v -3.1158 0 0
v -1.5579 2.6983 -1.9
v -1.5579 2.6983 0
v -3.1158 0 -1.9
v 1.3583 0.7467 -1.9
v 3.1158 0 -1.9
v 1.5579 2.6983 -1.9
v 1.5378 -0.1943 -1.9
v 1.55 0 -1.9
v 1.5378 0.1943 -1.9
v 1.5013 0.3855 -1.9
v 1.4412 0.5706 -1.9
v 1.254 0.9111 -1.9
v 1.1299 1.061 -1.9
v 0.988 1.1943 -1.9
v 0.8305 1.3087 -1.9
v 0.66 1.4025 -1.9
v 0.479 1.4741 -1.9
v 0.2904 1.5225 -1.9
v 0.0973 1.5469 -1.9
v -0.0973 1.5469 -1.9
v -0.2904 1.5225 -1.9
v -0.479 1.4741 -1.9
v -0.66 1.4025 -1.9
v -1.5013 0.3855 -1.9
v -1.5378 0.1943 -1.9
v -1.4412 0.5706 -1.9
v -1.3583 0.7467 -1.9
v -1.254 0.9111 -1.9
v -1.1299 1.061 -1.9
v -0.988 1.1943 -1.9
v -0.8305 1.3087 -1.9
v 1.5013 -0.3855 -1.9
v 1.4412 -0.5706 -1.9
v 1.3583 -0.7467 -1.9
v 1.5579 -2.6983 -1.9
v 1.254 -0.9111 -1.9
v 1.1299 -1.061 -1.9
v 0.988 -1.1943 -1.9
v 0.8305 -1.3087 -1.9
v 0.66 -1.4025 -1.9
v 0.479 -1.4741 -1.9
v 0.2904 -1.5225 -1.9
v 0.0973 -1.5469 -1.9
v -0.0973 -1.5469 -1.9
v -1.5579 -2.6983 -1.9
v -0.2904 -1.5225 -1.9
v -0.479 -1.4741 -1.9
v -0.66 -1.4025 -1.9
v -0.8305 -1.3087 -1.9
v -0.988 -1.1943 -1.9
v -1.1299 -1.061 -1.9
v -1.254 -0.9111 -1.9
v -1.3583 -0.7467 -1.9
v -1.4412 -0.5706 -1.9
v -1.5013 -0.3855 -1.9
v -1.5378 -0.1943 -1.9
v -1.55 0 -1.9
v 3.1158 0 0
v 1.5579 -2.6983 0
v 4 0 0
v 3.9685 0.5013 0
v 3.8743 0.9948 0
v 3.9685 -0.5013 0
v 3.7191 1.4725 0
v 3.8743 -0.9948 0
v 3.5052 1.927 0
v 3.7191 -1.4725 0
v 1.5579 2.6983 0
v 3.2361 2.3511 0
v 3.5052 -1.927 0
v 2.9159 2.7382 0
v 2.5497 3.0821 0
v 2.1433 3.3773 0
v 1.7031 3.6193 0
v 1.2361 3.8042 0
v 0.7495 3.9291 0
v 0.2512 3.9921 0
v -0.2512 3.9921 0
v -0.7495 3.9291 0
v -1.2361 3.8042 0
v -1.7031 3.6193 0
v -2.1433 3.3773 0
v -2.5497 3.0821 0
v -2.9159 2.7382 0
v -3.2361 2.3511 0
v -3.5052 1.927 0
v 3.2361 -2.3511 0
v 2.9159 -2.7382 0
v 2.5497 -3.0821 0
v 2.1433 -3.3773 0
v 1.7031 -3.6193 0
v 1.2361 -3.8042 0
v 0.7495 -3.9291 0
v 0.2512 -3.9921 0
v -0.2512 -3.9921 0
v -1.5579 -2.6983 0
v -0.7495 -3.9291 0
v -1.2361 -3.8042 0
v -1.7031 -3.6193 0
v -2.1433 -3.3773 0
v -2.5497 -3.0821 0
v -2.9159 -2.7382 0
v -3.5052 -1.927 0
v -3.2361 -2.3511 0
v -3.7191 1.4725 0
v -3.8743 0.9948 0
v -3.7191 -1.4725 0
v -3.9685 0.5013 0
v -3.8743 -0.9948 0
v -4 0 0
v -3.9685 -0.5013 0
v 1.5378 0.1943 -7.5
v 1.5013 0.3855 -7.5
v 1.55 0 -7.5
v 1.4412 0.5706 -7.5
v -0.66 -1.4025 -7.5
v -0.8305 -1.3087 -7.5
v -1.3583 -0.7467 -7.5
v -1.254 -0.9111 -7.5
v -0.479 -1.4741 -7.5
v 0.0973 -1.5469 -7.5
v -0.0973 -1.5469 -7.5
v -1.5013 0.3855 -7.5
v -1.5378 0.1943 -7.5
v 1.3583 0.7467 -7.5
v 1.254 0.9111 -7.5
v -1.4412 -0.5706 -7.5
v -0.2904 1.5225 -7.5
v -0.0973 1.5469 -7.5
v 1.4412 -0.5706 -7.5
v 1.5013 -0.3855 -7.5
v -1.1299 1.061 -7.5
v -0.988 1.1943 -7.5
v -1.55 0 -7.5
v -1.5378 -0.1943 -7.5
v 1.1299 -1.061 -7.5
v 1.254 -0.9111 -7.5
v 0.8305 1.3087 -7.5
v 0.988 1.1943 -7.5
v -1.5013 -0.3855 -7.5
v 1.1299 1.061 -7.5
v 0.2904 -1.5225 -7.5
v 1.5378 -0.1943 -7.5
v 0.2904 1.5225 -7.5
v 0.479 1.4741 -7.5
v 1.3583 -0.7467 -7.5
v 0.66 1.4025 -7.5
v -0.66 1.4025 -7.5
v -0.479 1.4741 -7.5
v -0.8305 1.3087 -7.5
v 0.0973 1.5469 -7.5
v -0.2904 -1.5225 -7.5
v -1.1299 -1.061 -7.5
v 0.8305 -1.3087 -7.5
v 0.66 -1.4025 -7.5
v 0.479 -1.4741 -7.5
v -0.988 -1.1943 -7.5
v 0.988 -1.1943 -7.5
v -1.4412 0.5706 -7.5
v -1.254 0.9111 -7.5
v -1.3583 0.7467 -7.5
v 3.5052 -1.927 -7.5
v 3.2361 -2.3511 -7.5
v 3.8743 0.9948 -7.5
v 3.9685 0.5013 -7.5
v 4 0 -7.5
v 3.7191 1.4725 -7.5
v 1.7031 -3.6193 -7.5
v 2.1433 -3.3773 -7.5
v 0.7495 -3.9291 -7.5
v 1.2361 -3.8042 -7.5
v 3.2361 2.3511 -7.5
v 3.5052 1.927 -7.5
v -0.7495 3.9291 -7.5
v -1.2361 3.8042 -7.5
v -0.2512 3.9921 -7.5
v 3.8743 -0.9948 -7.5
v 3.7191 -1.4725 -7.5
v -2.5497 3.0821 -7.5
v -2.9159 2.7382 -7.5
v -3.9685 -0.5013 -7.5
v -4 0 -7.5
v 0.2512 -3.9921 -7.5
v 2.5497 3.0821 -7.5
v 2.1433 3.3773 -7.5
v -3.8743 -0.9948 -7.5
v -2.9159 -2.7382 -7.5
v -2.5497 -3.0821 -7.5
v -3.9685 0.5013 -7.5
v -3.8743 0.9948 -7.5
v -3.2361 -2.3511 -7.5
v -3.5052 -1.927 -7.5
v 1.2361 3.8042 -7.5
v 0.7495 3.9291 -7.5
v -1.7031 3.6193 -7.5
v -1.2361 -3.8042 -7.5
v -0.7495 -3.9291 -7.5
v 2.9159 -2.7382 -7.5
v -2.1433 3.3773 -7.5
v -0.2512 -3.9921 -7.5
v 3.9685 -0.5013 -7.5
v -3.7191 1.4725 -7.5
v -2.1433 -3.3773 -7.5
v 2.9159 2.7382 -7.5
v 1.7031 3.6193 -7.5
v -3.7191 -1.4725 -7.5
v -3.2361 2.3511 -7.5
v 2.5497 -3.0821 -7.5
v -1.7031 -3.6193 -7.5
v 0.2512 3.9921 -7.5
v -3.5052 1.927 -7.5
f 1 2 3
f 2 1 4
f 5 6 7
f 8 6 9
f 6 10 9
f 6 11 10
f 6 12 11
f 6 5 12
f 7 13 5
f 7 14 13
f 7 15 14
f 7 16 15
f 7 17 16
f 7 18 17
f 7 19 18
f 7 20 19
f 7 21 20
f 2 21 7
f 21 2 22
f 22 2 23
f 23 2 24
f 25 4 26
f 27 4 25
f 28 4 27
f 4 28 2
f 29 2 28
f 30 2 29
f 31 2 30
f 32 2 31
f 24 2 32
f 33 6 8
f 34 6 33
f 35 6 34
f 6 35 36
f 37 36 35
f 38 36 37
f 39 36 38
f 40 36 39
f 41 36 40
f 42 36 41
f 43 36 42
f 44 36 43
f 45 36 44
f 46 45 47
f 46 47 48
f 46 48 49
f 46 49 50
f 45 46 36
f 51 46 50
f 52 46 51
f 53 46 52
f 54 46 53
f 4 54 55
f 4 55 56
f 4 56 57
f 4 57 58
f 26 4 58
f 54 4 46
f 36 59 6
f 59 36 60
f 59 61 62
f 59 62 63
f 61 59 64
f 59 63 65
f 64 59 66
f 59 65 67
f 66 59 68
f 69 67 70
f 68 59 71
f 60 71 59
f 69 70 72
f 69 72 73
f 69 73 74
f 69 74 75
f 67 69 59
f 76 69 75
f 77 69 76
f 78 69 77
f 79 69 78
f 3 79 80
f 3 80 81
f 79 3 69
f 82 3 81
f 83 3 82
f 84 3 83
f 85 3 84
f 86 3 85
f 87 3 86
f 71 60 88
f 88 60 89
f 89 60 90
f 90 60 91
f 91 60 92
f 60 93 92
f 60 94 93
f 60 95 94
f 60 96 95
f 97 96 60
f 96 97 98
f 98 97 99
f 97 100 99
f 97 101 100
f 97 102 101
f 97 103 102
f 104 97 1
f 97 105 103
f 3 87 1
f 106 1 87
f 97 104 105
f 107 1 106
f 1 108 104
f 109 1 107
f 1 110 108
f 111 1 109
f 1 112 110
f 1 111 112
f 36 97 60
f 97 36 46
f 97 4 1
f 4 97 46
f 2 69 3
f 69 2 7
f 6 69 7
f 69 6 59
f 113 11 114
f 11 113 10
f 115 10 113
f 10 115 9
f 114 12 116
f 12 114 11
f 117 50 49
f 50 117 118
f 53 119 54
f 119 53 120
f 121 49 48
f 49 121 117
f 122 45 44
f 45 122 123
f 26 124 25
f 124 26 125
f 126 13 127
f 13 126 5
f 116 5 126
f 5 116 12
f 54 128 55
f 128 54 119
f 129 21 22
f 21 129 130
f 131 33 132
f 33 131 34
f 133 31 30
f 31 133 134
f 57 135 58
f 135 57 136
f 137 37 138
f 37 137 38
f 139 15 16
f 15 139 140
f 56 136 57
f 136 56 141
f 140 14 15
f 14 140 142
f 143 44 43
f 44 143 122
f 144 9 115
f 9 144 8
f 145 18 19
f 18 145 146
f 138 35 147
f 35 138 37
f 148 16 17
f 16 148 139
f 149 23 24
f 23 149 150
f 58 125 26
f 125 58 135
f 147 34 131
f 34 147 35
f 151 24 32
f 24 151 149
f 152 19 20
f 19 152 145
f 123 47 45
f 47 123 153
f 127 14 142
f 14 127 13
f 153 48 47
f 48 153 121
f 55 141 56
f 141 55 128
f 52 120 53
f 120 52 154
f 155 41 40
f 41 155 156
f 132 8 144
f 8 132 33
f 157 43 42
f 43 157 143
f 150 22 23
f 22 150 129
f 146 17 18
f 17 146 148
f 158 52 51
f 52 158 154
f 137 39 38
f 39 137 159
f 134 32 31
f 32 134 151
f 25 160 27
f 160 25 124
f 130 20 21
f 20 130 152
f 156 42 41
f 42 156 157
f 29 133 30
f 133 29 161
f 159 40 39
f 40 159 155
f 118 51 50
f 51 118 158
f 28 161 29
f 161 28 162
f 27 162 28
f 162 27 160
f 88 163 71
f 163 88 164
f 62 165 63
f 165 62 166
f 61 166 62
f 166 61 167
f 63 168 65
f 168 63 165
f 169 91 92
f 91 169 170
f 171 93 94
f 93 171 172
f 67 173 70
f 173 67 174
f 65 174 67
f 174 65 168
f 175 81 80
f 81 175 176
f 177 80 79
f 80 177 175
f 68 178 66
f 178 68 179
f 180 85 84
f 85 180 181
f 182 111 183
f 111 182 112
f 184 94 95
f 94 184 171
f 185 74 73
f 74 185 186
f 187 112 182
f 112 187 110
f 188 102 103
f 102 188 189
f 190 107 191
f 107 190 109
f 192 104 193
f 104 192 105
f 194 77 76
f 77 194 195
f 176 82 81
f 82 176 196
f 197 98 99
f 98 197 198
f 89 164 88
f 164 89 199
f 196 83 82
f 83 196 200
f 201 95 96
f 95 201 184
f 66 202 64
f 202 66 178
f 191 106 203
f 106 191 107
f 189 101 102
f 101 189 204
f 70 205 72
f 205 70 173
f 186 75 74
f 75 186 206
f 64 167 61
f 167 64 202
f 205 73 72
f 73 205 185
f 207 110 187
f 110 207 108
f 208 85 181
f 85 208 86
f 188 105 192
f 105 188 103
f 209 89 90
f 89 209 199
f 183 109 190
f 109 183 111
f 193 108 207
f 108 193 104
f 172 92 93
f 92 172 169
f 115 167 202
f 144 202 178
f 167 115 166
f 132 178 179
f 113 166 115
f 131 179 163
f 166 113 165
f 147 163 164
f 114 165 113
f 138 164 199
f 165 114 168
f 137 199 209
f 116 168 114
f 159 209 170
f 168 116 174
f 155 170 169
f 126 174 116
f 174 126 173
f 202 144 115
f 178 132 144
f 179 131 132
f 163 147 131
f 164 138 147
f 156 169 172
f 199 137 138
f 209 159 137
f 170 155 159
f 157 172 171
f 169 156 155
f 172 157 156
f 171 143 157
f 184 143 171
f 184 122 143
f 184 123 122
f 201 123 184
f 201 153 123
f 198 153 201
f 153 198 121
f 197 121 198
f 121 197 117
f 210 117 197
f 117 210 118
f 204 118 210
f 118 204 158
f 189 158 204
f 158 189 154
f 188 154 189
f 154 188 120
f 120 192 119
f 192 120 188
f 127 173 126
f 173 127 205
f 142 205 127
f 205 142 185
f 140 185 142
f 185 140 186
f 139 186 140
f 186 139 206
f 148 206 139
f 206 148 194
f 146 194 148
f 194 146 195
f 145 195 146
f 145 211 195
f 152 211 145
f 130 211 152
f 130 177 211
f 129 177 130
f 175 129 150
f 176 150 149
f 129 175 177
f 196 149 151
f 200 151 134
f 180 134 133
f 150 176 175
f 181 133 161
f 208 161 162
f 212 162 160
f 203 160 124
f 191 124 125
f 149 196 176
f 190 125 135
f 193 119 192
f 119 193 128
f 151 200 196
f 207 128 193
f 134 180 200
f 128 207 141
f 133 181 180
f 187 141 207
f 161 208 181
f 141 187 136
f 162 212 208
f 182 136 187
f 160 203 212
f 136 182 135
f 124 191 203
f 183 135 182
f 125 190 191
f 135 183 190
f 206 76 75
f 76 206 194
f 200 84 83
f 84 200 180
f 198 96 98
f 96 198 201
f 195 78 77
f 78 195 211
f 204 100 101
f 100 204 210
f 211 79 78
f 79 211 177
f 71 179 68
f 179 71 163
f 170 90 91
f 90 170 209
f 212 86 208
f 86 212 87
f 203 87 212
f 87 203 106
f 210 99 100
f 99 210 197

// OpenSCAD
$fn = 50;

difference() {
	union() {
		translate(v = [0, 0, -7.5]) {
			cylinder(h = 10.5, r = 4.0);
		}
	}
	union() {
		translate(v = [0, 0, 0]) {
			rotate(a = [0, 0, 0]) {
				difference() {
					union() {
						translate(v = [0, 0, -1.9]) {
							linear_extrude(height = 1.9) {
								polygon(points = [[3.1158, 0.0], [1.5579000000000005, 2.698361953111554], [-1.5578999999999994, 2.6983619531115544], [-3.1158, 3.815754496783323e-16], [-1.5579000000000014, -2.6983619531115535], [1.557899999999998, -2.6983619531115552]]);
							}
						}
					}
					union();
				}
			}
		}
		#cylinder(h = 3, r = 5.0);
		#translate(v = [0, 0, -100.0]) {
			cylinder(h = 200, r = 1.55);
		}
	}
}
